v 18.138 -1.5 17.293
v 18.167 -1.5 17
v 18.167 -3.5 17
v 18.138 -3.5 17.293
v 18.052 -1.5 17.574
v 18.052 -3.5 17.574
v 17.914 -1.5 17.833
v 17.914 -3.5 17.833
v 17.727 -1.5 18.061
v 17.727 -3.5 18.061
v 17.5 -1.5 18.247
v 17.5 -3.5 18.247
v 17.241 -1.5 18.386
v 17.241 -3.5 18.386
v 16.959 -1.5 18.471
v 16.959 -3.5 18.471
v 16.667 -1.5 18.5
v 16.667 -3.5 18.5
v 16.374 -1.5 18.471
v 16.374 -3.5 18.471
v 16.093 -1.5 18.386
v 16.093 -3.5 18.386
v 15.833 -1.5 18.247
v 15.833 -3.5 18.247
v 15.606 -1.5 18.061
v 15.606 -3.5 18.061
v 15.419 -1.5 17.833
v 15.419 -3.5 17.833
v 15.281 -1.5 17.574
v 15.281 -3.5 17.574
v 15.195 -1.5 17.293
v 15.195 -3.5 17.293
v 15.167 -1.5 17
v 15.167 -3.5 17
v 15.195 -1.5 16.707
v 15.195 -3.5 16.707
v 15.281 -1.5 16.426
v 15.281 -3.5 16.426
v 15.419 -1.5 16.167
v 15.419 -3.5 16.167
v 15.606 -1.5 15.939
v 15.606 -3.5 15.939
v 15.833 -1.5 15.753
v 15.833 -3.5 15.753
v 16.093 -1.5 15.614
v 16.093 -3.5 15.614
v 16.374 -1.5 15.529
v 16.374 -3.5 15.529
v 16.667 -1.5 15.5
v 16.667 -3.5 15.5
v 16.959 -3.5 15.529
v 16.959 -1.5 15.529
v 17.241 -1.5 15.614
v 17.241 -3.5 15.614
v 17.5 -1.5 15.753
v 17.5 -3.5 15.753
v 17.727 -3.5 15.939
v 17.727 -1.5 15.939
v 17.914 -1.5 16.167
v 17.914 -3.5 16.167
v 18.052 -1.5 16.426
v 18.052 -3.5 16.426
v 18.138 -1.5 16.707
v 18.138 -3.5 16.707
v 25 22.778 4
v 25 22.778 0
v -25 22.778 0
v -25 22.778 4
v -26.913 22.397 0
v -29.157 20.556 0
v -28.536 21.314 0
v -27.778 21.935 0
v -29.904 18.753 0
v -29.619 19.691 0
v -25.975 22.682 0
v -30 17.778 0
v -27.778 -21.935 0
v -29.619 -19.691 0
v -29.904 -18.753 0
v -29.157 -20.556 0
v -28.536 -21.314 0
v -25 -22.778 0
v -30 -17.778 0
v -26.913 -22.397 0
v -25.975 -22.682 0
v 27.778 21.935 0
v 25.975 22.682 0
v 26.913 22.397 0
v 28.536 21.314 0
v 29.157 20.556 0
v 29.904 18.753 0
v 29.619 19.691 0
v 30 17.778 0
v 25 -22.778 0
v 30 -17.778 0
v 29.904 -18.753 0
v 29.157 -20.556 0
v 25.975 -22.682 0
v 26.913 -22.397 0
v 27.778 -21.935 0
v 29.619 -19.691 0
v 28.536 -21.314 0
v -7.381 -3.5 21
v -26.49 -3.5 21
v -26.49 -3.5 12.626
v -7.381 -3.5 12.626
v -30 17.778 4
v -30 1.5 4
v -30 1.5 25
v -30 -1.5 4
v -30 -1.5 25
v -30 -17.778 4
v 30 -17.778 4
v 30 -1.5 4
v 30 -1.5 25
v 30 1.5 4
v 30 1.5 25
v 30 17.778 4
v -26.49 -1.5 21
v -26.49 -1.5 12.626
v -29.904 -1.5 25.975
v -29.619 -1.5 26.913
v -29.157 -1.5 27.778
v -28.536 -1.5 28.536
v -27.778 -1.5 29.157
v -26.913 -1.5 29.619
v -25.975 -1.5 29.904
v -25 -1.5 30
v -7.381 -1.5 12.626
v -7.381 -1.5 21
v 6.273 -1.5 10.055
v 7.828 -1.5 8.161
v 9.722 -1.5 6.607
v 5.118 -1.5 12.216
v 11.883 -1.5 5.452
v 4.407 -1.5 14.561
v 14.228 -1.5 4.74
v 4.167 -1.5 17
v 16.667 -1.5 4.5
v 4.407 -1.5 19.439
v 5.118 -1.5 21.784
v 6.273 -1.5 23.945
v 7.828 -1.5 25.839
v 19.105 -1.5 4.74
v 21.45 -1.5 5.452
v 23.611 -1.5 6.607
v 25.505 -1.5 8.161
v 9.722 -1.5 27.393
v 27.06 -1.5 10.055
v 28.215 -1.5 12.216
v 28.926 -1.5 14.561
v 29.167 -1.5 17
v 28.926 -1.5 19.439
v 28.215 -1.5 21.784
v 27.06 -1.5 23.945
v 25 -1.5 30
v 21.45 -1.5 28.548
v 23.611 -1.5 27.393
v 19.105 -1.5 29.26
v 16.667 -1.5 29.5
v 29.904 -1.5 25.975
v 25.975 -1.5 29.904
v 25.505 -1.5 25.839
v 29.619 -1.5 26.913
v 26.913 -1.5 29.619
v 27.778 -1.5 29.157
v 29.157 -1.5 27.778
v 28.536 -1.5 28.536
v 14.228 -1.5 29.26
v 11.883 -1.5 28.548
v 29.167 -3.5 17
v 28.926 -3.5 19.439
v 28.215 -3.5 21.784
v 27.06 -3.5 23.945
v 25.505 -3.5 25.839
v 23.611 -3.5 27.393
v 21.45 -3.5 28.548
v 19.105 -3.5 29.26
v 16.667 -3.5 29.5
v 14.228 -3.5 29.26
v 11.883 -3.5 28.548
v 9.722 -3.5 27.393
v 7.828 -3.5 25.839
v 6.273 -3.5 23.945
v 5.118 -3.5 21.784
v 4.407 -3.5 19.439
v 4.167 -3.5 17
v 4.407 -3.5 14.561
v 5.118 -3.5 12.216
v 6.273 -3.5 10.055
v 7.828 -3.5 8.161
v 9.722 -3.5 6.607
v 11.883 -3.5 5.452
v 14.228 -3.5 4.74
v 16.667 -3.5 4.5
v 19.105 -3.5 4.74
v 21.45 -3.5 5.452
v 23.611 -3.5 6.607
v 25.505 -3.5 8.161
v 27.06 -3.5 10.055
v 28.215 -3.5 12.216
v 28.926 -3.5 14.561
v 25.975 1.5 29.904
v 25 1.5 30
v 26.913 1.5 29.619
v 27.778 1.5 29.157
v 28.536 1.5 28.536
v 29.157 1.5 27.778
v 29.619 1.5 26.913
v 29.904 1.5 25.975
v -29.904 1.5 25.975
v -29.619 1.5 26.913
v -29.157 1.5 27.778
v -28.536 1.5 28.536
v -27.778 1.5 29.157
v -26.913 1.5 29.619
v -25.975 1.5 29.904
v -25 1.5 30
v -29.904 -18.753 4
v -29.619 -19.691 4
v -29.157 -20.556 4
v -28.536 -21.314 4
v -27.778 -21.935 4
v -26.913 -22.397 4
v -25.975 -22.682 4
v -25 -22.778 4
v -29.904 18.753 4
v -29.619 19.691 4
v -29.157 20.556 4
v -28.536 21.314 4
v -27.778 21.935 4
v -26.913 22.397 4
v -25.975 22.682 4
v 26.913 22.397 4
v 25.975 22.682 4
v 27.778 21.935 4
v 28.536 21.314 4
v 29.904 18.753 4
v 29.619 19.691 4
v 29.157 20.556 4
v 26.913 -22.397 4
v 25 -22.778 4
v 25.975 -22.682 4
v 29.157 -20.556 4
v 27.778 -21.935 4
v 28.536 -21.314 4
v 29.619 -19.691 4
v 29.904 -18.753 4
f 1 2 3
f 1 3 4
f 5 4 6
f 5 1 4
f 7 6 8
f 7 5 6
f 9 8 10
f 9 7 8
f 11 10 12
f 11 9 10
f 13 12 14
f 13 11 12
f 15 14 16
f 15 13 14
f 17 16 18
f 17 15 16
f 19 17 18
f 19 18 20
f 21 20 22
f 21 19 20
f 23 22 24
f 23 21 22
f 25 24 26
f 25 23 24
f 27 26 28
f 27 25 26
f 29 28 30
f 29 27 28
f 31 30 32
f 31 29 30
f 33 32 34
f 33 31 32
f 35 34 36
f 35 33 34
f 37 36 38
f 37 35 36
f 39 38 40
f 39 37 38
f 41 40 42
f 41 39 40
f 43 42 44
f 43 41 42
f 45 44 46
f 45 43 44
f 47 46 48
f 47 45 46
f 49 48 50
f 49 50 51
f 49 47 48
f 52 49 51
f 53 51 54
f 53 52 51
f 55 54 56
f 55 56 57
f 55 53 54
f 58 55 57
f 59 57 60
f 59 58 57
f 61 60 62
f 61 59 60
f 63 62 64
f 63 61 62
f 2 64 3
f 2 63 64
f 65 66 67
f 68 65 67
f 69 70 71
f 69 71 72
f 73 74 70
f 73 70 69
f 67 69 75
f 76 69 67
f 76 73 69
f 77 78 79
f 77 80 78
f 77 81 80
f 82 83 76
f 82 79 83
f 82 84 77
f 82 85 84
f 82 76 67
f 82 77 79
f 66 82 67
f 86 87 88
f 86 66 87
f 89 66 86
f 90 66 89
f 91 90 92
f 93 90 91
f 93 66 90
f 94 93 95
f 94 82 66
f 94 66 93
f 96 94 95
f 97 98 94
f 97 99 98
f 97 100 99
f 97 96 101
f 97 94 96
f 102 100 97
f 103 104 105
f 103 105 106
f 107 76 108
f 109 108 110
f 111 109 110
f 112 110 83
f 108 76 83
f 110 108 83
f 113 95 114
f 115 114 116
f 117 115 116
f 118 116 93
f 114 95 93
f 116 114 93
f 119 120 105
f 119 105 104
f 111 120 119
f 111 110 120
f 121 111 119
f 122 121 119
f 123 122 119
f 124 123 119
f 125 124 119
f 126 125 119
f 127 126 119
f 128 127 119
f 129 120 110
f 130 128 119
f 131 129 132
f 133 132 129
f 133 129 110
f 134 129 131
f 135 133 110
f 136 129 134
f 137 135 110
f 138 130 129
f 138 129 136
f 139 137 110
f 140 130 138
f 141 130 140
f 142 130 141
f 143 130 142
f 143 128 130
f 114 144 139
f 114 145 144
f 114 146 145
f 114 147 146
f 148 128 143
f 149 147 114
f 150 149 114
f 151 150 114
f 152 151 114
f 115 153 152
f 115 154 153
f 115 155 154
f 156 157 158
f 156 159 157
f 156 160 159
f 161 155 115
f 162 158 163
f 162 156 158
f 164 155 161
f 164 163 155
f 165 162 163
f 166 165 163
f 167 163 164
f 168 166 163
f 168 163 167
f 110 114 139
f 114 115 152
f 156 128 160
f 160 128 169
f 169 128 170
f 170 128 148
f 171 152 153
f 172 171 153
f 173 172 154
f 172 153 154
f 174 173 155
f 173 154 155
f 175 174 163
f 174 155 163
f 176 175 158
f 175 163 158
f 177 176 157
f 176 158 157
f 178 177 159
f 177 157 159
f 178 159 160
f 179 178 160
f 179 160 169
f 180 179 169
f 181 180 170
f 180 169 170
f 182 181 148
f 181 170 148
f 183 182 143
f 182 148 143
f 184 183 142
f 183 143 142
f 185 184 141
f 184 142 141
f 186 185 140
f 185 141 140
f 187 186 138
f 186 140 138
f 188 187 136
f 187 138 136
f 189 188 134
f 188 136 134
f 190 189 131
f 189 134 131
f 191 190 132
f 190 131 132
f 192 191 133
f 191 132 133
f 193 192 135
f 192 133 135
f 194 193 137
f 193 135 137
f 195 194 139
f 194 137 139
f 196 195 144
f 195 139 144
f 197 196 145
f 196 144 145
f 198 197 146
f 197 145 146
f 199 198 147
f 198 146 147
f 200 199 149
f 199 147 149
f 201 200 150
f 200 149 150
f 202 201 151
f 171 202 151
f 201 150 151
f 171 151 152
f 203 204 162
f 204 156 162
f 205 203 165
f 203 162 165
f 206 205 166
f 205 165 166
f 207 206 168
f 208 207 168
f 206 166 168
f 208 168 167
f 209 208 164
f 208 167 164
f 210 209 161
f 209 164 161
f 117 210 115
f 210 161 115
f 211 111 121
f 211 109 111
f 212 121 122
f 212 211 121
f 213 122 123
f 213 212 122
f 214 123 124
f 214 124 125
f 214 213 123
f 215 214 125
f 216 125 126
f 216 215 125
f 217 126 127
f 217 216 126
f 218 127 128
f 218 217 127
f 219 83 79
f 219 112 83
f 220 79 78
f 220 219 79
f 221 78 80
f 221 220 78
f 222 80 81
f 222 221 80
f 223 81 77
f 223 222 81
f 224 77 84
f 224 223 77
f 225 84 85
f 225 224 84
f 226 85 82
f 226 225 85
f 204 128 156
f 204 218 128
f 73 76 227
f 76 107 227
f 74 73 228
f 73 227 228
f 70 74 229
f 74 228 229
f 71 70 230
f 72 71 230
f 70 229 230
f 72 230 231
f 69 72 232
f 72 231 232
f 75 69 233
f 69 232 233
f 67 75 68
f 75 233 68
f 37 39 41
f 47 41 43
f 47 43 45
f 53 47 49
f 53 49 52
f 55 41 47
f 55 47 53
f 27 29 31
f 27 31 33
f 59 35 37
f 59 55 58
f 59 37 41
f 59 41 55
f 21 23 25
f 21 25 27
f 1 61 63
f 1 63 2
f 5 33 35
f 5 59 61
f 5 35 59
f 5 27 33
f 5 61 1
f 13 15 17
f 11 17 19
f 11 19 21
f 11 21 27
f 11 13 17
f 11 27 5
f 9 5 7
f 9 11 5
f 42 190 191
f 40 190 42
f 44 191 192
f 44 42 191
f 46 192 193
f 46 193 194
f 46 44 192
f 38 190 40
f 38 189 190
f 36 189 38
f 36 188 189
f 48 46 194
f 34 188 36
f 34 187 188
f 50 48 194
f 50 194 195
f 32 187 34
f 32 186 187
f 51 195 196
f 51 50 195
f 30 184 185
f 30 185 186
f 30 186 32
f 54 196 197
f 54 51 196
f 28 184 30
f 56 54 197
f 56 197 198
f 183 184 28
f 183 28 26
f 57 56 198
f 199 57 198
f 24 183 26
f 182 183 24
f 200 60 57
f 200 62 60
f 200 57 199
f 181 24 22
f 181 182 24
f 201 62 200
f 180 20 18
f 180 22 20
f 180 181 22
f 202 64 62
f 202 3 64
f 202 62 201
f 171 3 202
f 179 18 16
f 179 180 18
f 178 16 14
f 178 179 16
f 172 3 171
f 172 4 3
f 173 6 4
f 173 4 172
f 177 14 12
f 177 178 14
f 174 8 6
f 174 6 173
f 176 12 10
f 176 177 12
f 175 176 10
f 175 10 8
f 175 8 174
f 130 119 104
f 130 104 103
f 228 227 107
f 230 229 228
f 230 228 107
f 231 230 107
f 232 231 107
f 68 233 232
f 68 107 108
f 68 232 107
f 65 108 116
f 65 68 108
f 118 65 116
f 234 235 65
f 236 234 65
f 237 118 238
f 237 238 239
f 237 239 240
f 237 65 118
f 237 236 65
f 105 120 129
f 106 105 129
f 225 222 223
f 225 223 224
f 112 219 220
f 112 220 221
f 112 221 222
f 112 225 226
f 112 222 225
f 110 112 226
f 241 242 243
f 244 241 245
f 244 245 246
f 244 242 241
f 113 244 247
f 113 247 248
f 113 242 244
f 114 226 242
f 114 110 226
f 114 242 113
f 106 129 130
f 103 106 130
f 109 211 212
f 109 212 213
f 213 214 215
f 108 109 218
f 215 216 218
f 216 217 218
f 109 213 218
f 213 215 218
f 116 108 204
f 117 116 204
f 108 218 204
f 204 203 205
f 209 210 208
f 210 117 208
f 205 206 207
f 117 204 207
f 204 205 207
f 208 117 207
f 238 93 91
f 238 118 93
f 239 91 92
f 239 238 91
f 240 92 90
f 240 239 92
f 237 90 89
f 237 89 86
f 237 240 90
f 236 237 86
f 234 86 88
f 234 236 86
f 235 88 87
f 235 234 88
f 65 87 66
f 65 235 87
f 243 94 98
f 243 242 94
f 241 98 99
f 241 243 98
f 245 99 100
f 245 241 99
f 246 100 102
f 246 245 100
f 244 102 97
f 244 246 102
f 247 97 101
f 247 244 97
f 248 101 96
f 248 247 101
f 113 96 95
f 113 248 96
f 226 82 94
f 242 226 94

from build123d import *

# Parameters (mm, degrees)
F1_DEPTH      = 4
F2_W          = 60
F2_H          = 30
F3_DEPTH      = 1.5
F3_DEPTH_BACK = 1.5
F4_R          = 5
F5_R          = 5
F6_R          = 12.5
F6_R_2        = 1.5
F6_W          = 19.108927
F6_H          = 8.373576
F7_DEPTH      = 2


with BuildPart() as f1:
    # F0 (on Top) → F1 (new body)
    with BuildSketch(Plane.XY):
        Polygon((-30, -22.77798), (30, -22.77798), (30, 0), (0, 0), (-30, 0), align=None)
        Polygon((0, 0), (30, 0), (30, 22.77798), (-30, 22.77798), (-30, 0), align=None)
    extrude(amount=F1_DEPTH)

    # F2 (on Front) → F3 (join, two sides)
    with BuildSketch(Plane.XZ) as f3_sk:
        with Locations((0, 15)):
            Rectangle(F2_W, F2_H)
    extrude(amount=F3_DEPTH)
    extrude(f3_sk.sketch, amount=-F3_DEPTH_BACK)

    # F4
    f4_edges = [f1.edges().sort_by_distance(p)[0] for p in [
        (-30, -22.77798, 2),
        (30, -22.77798, 2),
        (30, 22.77798, 2),
        (-30, 22.77798, 2),
    ]]
    fillet(f4_edges, radius=F4_R)

    # F5
    f5_edges = [f1.edges().sort_by_distance(p)[0] for p in [
        (-30, 0, 30),
        (30, 0, 30),
    ]]
    fillet(f5_edges, radius=F5_R)

    # F6 (on face) → F7 (join)
    with BuildSketch(Plane.XZ.offset(1.5)):
        with Locations((16.666592, 17)):
            Circle(F6_R)
        with Locations((16.666592, 17)):
            Circle(F6_R_2, mode=Mode.SUBTRACT)
        with Locations((-16.935061, 16.813212)):
            Rectangle(F6_W, F6_H)
    extrude(amount=F7_DEPTH)


solid = f1.part
